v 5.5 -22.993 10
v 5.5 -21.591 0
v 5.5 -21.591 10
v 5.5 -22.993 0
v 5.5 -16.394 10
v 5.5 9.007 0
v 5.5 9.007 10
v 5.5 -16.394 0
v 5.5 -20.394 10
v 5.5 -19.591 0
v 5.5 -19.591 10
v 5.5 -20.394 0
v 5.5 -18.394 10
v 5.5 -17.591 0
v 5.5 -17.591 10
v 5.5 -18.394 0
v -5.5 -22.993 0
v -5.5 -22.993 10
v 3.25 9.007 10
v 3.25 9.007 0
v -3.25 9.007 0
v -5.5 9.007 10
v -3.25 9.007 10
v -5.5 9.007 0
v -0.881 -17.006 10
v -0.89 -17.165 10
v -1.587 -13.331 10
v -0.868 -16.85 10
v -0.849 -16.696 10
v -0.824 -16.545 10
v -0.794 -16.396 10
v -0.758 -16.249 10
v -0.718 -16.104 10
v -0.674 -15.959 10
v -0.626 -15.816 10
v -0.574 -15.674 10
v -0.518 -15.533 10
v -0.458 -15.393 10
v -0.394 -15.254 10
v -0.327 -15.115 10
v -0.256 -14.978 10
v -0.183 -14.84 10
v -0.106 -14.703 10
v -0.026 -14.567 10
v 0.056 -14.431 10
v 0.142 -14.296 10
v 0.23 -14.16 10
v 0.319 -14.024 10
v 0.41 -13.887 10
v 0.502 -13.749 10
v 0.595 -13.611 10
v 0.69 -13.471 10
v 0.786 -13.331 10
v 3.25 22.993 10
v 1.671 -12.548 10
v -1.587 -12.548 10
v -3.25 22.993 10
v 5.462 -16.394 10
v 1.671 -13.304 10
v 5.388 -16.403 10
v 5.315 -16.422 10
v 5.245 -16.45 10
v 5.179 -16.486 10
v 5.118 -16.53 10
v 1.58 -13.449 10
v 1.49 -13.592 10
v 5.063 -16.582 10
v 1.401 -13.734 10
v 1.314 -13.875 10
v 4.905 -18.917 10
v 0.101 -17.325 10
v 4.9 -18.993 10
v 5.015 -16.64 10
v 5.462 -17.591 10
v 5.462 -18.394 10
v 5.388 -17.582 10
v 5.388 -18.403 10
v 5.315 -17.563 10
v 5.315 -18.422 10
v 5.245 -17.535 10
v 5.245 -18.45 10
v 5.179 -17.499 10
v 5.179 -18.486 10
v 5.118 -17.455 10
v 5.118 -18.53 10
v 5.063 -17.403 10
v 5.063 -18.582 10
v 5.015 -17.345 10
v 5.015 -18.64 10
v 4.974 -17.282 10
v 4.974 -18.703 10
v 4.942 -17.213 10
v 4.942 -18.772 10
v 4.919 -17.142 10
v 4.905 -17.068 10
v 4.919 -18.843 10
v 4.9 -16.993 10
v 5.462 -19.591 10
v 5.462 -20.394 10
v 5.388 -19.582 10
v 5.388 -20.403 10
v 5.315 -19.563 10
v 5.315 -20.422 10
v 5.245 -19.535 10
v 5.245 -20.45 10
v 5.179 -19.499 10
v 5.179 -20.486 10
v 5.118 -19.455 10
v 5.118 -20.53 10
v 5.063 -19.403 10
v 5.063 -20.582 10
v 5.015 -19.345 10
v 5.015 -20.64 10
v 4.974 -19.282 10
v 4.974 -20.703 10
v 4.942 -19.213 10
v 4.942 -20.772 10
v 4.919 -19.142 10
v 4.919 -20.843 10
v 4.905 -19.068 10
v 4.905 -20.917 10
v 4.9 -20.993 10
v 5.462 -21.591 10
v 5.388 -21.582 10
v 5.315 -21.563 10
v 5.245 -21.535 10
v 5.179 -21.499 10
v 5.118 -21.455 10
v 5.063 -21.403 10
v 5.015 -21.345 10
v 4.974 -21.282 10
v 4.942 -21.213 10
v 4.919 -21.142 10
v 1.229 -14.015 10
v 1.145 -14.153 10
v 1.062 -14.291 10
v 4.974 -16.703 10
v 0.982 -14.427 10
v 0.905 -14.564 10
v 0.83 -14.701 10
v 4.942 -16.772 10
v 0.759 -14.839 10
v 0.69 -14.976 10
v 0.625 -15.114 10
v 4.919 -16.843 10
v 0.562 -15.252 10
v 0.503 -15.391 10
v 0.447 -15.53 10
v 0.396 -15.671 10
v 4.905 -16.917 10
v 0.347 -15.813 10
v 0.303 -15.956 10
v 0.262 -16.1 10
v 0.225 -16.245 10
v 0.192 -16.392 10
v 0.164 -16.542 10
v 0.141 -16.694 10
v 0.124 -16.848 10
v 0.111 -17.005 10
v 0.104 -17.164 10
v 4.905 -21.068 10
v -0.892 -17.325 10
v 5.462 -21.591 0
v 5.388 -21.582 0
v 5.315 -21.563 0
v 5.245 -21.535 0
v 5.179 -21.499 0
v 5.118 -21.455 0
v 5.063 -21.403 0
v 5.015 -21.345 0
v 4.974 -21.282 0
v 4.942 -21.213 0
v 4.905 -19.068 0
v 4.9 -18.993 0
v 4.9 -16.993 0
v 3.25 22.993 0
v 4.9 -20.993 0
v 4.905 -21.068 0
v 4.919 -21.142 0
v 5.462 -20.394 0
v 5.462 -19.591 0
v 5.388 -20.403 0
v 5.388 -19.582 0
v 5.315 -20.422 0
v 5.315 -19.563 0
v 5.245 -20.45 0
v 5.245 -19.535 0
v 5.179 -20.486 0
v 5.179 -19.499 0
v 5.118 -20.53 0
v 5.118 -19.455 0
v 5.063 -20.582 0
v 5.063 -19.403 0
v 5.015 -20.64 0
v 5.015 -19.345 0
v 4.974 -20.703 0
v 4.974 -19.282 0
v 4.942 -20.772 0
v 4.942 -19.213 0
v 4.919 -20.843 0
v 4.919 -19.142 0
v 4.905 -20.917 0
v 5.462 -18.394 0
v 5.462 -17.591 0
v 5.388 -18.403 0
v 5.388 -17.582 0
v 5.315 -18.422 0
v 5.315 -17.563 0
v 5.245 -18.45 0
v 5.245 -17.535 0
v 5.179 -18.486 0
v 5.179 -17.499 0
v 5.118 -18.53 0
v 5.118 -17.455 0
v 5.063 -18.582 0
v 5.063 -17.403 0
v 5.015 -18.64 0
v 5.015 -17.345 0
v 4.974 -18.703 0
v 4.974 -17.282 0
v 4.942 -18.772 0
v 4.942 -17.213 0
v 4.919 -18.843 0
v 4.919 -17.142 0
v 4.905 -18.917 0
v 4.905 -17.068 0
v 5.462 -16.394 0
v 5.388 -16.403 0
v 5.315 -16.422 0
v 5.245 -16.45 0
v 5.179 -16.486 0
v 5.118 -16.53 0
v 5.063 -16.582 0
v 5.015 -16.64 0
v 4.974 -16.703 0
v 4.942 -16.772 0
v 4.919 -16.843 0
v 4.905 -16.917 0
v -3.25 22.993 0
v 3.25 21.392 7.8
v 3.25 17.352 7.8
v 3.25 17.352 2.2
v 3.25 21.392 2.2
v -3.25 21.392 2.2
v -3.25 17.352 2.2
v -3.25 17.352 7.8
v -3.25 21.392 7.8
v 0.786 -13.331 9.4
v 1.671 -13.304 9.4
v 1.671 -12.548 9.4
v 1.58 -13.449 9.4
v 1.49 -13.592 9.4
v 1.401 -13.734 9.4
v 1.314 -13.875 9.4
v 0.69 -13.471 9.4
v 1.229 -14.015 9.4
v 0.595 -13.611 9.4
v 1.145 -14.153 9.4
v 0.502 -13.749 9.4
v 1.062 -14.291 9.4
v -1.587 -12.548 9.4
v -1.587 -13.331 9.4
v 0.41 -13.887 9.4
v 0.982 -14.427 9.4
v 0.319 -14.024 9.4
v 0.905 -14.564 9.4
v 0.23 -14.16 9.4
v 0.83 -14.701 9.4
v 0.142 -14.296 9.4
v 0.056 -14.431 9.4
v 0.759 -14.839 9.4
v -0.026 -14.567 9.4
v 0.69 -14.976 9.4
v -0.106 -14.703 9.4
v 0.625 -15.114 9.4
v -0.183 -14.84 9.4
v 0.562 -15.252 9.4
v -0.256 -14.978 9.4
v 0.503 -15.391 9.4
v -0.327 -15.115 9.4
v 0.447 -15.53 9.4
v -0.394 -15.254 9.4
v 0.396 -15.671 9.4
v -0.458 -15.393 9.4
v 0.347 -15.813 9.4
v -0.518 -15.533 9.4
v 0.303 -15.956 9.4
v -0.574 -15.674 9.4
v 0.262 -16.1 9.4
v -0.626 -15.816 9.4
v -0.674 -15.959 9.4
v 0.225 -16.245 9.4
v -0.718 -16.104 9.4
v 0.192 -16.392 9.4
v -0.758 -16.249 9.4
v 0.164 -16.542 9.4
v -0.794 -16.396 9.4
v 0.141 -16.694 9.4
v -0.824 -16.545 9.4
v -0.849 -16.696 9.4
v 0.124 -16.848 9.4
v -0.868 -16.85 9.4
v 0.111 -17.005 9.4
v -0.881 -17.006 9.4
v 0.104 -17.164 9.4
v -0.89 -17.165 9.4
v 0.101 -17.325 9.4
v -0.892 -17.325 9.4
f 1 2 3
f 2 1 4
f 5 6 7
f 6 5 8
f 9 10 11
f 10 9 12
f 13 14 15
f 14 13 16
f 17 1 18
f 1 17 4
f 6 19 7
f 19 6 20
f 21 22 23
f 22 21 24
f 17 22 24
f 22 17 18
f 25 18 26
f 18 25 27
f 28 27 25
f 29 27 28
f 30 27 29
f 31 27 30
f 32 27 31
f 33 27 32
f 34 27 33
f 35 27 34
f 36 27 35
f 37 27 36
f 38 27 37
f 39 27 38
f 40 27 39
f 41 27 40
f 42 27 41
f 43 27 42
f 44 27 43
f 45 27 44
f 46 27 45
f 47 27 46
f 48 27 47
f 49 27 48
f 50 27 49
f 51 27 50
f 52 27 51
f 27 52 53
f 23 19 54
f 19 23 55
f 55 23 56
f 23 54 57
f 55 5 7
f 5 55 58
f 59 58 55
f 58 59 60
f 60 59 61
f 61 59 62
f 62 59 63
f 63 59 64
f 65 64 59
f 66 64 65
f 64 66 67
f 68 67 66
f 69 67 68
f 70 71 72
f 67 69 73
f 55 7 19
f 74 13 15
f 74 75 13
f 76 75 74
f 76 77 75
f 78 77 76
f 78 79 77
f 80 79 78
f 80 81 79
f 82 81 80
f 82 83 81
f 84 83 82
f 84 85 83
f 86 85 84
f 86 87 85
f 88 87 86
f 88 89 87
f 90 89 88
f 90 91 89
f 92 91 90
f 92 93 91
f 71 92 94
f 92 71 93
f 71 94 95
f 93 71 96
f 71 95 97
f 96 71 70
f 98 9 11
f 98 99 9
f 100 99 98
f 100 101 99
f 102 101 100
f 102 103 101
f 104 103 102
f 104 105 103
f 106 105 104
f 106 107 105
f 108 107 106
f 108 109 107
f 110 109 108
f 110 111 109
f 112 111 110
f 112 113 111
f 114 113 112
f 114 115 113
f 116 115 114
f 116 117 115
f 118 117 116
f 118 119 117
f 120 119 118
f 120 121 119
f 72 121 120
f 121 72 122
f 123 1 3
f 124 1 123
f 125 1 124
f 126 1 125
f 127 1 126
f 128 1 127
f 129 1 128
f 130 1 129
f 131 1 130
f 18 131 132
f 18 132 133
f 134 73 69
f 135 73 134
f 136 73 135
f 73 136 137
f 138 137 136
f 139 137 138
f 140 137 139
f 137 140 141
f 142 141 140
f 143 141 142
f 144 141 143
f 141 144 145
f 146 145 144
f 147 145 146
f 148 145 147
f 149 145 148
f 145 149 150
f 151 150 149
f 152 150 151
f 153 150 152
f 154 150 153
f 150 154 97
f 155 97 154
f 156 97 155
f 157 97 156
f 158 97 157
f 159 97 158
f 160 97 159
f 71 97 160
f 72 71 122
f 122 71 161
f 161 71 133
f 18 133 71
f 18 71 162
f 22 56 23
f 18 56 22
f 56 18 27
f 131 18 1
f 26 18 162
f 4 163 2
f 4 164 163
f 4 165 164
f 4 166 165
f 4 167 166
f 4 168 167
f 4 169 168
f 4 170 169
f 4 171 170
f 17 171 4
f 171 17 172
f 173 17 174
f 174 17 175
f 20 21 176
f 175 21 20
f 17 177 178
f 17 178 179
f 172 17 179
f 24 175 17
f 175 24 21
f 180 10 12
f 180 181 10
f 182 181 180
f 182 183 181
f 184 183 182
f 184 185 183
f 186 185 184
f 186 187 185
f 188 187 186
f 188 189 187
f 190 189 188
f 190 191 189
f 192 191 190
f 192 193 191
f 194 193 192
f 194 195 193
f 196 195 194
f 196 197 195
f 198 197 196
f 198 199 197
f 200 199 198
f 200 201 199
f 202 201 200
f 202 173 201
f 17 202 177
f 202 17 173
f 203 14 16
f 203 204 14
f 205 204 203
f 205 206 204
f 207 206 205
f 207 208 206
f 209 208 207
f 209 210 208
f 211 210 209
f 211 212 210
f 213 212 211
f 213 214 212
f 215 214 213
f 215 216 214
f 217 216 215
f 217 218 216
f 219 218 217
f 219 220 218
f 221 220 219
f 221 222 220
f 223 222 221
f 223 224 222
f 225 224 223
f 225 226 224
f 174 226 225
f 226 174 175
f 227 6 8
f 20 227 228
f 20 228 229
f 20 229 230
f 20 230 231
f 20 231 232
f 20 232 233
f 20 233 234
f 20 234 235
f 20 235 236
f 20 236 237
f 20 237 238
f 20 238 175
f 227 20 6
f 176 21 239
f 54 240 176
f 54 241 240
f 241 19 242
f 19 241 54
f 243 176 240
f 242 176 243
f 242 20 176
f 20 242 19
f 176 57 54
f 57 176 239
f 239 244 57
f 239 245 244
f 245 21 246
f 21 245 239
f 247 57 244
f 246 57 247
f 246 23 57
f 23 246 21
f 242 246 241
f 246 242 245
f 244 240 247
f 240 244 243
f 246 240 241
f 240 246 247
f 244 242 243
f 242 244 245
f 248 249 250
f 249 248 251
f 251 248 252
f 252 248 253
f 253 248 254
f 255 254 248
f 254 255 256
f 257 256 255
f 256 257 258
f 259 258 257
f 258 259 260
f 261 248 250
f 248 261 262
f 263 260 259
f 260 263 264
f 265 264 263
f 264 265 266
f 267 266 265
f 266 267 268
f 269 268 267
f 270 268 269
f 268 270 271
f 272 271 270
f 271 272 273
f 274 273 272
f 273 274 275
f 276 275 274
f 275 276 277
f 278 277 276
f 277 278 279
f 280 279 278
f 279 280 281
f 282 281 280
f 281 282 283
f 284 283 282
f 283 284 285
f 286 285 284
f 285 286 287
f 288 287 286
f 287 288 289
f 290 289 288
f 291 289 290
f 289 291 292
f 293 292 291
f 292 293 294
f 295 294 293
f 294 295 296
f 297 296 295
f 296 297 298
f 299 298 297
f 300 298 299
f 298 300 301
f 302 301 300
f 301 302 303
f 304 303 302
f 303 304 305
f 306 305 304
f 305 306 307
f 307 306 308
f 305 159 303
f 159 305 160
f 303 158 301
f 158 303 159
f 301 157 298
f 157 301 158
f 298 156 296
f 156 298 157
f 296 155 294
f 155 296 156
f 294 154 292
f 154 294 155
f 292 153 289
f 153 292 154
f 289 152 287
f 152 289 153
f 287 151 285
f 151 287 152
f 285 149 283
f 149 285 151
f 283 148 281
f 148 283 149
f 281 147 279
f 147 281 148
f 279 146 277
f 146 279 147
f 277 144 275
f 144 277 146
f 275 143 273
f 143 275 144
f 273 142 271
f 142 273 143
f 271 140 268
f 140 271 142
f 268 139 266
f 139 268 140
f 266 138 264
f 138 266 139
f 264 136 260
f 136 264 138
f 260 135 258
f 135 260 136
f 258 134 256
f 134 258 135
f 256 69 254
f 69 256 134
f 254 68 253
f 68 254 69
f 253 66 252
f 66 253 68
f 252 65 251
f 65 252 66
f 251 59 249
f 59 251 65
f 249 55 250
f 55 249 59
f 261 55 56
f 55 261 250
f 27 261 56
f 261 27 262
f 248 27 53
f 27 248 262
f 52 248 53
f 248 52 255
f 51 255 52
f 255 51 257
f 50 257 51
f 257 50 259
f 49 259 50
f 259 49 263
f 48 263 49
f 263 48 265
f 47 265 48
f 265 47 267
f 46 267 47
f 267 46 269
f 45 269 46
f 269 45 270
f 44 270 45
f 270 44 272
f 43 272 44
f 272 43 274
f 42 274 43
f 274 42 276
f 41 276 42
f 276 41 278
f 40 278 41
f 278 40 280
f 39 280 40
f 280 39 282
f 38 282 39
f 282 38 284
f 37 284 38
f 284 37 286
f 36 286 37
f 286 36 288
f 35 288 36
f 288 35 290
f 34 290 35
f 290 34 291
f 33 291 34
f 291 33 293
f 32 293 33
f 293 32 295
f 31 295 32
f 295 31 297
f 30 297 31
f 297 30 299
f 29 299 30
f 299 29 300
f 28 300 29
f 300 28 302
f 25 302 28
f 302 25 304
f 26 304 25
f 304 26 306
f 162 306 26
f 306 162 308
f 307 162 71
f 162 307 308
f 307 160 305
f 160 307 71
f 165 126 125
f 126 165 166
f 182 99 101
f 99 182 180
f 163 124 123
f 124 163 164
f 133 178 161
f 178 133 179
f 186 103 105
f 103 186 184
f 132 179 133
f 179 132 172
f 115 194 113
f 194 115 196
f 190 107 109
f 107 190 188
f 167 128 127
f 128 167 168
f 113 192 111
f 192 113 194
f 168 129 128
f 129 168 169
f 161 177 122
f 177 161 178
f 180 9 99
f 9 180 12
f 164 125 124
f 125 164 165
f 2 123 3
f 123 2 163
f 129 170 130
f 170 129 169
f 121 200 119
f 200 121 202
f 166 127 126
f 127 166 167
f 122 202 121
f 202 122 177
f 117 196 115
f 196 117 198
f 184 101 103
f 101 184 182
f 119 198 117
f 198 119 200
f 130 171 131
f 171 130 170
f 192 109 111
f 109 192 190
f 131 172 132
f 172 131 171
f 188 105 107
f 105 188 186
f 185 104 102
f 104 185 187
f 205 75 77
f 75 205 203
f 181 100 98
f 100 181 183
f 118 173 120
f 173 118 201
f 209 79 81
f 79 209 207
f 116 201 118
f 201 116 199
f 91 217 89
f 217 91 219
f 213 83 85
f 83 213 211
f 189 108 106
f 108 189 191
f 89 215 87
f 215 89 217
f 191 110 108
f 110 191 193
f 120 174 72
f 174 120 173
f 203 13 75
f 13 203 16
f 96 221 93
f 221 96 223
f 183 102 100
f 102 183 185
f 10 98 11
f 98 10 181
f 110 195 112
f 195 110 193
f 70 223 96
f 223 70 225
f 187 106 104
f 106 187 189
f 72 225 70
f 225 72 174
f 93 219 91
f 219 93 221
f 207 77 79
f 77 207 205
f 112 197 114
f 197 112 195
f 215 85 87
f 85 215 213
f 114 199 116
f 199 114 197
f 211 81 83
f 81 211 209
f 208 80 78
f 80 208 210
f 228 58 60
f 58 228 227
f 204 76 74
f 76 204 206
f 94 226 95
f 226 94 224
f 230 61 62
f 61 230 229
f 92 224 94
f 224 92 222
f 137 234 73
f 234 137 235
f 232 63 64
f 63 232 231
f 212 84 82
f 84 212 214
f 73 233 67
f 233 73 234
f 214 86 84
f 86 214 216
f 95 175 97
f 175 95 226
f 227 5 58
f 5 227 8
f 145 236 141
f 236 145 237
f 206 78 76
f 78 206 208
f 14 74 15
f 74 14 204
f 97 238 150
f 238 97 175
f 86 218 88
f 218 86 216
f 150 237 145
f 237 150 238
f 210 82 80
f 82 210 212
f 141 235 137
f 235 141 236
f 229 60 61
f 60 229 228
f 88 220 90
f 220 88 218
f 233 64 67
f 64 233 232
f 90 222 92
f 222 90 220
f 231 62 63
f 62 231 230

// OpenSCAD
$fn = 50;

difference() {
	union() {
		translate(v = [0, 9.0075, 0]) {
			rotate(a = [90, 0, 0]) {
				difference() {
					union() {
						translate(v = [-5.5, 0, 0]) {
							cube(size = [11.0, 10.0, 32.0]);
						}
						translate(v = [-3.25, 0, -13.985]) {
							cube(size = [6.5, 10.0, 14.084999999999999]);
						}
					}
					union() {
						translate(v = [-3.35, 2.1999999999999997, -12.385]) {
							cube(size = [6.7, 5.6000000000000005, 4.04]);
						}
						translate(v = [0, 9.4, 24.0]) {
							rotate(a = [-90, 0, 0]) {
								linear_extrude(height = 0.7) {
									text(font = "Arial:style=Bold", halign = "center", size = 5.0, text = "7", valign = "center");
								}
							}
						}
						translate(v = [5.5, 10.1, 30.0]) {
							rotate(a = [90, 0, 0]) {
								cylinder(h = 10.2, r = 0.6);
							}
						}
						translate(v = [5.5, 10.1, 28.0]) {
							rotate(a = [90, 0, 0]) {
								cylinder(h = 10.2, r = 0.6);
							}
						}
						translate(v = [5.5, 10.1, 26.0]) {
							rotate(a = [90, 0, 0]) {
								cylinder(h = 10.2, r = 0.6);
							}
						}
					}
				}
			}
		}
	}
	union();
}
